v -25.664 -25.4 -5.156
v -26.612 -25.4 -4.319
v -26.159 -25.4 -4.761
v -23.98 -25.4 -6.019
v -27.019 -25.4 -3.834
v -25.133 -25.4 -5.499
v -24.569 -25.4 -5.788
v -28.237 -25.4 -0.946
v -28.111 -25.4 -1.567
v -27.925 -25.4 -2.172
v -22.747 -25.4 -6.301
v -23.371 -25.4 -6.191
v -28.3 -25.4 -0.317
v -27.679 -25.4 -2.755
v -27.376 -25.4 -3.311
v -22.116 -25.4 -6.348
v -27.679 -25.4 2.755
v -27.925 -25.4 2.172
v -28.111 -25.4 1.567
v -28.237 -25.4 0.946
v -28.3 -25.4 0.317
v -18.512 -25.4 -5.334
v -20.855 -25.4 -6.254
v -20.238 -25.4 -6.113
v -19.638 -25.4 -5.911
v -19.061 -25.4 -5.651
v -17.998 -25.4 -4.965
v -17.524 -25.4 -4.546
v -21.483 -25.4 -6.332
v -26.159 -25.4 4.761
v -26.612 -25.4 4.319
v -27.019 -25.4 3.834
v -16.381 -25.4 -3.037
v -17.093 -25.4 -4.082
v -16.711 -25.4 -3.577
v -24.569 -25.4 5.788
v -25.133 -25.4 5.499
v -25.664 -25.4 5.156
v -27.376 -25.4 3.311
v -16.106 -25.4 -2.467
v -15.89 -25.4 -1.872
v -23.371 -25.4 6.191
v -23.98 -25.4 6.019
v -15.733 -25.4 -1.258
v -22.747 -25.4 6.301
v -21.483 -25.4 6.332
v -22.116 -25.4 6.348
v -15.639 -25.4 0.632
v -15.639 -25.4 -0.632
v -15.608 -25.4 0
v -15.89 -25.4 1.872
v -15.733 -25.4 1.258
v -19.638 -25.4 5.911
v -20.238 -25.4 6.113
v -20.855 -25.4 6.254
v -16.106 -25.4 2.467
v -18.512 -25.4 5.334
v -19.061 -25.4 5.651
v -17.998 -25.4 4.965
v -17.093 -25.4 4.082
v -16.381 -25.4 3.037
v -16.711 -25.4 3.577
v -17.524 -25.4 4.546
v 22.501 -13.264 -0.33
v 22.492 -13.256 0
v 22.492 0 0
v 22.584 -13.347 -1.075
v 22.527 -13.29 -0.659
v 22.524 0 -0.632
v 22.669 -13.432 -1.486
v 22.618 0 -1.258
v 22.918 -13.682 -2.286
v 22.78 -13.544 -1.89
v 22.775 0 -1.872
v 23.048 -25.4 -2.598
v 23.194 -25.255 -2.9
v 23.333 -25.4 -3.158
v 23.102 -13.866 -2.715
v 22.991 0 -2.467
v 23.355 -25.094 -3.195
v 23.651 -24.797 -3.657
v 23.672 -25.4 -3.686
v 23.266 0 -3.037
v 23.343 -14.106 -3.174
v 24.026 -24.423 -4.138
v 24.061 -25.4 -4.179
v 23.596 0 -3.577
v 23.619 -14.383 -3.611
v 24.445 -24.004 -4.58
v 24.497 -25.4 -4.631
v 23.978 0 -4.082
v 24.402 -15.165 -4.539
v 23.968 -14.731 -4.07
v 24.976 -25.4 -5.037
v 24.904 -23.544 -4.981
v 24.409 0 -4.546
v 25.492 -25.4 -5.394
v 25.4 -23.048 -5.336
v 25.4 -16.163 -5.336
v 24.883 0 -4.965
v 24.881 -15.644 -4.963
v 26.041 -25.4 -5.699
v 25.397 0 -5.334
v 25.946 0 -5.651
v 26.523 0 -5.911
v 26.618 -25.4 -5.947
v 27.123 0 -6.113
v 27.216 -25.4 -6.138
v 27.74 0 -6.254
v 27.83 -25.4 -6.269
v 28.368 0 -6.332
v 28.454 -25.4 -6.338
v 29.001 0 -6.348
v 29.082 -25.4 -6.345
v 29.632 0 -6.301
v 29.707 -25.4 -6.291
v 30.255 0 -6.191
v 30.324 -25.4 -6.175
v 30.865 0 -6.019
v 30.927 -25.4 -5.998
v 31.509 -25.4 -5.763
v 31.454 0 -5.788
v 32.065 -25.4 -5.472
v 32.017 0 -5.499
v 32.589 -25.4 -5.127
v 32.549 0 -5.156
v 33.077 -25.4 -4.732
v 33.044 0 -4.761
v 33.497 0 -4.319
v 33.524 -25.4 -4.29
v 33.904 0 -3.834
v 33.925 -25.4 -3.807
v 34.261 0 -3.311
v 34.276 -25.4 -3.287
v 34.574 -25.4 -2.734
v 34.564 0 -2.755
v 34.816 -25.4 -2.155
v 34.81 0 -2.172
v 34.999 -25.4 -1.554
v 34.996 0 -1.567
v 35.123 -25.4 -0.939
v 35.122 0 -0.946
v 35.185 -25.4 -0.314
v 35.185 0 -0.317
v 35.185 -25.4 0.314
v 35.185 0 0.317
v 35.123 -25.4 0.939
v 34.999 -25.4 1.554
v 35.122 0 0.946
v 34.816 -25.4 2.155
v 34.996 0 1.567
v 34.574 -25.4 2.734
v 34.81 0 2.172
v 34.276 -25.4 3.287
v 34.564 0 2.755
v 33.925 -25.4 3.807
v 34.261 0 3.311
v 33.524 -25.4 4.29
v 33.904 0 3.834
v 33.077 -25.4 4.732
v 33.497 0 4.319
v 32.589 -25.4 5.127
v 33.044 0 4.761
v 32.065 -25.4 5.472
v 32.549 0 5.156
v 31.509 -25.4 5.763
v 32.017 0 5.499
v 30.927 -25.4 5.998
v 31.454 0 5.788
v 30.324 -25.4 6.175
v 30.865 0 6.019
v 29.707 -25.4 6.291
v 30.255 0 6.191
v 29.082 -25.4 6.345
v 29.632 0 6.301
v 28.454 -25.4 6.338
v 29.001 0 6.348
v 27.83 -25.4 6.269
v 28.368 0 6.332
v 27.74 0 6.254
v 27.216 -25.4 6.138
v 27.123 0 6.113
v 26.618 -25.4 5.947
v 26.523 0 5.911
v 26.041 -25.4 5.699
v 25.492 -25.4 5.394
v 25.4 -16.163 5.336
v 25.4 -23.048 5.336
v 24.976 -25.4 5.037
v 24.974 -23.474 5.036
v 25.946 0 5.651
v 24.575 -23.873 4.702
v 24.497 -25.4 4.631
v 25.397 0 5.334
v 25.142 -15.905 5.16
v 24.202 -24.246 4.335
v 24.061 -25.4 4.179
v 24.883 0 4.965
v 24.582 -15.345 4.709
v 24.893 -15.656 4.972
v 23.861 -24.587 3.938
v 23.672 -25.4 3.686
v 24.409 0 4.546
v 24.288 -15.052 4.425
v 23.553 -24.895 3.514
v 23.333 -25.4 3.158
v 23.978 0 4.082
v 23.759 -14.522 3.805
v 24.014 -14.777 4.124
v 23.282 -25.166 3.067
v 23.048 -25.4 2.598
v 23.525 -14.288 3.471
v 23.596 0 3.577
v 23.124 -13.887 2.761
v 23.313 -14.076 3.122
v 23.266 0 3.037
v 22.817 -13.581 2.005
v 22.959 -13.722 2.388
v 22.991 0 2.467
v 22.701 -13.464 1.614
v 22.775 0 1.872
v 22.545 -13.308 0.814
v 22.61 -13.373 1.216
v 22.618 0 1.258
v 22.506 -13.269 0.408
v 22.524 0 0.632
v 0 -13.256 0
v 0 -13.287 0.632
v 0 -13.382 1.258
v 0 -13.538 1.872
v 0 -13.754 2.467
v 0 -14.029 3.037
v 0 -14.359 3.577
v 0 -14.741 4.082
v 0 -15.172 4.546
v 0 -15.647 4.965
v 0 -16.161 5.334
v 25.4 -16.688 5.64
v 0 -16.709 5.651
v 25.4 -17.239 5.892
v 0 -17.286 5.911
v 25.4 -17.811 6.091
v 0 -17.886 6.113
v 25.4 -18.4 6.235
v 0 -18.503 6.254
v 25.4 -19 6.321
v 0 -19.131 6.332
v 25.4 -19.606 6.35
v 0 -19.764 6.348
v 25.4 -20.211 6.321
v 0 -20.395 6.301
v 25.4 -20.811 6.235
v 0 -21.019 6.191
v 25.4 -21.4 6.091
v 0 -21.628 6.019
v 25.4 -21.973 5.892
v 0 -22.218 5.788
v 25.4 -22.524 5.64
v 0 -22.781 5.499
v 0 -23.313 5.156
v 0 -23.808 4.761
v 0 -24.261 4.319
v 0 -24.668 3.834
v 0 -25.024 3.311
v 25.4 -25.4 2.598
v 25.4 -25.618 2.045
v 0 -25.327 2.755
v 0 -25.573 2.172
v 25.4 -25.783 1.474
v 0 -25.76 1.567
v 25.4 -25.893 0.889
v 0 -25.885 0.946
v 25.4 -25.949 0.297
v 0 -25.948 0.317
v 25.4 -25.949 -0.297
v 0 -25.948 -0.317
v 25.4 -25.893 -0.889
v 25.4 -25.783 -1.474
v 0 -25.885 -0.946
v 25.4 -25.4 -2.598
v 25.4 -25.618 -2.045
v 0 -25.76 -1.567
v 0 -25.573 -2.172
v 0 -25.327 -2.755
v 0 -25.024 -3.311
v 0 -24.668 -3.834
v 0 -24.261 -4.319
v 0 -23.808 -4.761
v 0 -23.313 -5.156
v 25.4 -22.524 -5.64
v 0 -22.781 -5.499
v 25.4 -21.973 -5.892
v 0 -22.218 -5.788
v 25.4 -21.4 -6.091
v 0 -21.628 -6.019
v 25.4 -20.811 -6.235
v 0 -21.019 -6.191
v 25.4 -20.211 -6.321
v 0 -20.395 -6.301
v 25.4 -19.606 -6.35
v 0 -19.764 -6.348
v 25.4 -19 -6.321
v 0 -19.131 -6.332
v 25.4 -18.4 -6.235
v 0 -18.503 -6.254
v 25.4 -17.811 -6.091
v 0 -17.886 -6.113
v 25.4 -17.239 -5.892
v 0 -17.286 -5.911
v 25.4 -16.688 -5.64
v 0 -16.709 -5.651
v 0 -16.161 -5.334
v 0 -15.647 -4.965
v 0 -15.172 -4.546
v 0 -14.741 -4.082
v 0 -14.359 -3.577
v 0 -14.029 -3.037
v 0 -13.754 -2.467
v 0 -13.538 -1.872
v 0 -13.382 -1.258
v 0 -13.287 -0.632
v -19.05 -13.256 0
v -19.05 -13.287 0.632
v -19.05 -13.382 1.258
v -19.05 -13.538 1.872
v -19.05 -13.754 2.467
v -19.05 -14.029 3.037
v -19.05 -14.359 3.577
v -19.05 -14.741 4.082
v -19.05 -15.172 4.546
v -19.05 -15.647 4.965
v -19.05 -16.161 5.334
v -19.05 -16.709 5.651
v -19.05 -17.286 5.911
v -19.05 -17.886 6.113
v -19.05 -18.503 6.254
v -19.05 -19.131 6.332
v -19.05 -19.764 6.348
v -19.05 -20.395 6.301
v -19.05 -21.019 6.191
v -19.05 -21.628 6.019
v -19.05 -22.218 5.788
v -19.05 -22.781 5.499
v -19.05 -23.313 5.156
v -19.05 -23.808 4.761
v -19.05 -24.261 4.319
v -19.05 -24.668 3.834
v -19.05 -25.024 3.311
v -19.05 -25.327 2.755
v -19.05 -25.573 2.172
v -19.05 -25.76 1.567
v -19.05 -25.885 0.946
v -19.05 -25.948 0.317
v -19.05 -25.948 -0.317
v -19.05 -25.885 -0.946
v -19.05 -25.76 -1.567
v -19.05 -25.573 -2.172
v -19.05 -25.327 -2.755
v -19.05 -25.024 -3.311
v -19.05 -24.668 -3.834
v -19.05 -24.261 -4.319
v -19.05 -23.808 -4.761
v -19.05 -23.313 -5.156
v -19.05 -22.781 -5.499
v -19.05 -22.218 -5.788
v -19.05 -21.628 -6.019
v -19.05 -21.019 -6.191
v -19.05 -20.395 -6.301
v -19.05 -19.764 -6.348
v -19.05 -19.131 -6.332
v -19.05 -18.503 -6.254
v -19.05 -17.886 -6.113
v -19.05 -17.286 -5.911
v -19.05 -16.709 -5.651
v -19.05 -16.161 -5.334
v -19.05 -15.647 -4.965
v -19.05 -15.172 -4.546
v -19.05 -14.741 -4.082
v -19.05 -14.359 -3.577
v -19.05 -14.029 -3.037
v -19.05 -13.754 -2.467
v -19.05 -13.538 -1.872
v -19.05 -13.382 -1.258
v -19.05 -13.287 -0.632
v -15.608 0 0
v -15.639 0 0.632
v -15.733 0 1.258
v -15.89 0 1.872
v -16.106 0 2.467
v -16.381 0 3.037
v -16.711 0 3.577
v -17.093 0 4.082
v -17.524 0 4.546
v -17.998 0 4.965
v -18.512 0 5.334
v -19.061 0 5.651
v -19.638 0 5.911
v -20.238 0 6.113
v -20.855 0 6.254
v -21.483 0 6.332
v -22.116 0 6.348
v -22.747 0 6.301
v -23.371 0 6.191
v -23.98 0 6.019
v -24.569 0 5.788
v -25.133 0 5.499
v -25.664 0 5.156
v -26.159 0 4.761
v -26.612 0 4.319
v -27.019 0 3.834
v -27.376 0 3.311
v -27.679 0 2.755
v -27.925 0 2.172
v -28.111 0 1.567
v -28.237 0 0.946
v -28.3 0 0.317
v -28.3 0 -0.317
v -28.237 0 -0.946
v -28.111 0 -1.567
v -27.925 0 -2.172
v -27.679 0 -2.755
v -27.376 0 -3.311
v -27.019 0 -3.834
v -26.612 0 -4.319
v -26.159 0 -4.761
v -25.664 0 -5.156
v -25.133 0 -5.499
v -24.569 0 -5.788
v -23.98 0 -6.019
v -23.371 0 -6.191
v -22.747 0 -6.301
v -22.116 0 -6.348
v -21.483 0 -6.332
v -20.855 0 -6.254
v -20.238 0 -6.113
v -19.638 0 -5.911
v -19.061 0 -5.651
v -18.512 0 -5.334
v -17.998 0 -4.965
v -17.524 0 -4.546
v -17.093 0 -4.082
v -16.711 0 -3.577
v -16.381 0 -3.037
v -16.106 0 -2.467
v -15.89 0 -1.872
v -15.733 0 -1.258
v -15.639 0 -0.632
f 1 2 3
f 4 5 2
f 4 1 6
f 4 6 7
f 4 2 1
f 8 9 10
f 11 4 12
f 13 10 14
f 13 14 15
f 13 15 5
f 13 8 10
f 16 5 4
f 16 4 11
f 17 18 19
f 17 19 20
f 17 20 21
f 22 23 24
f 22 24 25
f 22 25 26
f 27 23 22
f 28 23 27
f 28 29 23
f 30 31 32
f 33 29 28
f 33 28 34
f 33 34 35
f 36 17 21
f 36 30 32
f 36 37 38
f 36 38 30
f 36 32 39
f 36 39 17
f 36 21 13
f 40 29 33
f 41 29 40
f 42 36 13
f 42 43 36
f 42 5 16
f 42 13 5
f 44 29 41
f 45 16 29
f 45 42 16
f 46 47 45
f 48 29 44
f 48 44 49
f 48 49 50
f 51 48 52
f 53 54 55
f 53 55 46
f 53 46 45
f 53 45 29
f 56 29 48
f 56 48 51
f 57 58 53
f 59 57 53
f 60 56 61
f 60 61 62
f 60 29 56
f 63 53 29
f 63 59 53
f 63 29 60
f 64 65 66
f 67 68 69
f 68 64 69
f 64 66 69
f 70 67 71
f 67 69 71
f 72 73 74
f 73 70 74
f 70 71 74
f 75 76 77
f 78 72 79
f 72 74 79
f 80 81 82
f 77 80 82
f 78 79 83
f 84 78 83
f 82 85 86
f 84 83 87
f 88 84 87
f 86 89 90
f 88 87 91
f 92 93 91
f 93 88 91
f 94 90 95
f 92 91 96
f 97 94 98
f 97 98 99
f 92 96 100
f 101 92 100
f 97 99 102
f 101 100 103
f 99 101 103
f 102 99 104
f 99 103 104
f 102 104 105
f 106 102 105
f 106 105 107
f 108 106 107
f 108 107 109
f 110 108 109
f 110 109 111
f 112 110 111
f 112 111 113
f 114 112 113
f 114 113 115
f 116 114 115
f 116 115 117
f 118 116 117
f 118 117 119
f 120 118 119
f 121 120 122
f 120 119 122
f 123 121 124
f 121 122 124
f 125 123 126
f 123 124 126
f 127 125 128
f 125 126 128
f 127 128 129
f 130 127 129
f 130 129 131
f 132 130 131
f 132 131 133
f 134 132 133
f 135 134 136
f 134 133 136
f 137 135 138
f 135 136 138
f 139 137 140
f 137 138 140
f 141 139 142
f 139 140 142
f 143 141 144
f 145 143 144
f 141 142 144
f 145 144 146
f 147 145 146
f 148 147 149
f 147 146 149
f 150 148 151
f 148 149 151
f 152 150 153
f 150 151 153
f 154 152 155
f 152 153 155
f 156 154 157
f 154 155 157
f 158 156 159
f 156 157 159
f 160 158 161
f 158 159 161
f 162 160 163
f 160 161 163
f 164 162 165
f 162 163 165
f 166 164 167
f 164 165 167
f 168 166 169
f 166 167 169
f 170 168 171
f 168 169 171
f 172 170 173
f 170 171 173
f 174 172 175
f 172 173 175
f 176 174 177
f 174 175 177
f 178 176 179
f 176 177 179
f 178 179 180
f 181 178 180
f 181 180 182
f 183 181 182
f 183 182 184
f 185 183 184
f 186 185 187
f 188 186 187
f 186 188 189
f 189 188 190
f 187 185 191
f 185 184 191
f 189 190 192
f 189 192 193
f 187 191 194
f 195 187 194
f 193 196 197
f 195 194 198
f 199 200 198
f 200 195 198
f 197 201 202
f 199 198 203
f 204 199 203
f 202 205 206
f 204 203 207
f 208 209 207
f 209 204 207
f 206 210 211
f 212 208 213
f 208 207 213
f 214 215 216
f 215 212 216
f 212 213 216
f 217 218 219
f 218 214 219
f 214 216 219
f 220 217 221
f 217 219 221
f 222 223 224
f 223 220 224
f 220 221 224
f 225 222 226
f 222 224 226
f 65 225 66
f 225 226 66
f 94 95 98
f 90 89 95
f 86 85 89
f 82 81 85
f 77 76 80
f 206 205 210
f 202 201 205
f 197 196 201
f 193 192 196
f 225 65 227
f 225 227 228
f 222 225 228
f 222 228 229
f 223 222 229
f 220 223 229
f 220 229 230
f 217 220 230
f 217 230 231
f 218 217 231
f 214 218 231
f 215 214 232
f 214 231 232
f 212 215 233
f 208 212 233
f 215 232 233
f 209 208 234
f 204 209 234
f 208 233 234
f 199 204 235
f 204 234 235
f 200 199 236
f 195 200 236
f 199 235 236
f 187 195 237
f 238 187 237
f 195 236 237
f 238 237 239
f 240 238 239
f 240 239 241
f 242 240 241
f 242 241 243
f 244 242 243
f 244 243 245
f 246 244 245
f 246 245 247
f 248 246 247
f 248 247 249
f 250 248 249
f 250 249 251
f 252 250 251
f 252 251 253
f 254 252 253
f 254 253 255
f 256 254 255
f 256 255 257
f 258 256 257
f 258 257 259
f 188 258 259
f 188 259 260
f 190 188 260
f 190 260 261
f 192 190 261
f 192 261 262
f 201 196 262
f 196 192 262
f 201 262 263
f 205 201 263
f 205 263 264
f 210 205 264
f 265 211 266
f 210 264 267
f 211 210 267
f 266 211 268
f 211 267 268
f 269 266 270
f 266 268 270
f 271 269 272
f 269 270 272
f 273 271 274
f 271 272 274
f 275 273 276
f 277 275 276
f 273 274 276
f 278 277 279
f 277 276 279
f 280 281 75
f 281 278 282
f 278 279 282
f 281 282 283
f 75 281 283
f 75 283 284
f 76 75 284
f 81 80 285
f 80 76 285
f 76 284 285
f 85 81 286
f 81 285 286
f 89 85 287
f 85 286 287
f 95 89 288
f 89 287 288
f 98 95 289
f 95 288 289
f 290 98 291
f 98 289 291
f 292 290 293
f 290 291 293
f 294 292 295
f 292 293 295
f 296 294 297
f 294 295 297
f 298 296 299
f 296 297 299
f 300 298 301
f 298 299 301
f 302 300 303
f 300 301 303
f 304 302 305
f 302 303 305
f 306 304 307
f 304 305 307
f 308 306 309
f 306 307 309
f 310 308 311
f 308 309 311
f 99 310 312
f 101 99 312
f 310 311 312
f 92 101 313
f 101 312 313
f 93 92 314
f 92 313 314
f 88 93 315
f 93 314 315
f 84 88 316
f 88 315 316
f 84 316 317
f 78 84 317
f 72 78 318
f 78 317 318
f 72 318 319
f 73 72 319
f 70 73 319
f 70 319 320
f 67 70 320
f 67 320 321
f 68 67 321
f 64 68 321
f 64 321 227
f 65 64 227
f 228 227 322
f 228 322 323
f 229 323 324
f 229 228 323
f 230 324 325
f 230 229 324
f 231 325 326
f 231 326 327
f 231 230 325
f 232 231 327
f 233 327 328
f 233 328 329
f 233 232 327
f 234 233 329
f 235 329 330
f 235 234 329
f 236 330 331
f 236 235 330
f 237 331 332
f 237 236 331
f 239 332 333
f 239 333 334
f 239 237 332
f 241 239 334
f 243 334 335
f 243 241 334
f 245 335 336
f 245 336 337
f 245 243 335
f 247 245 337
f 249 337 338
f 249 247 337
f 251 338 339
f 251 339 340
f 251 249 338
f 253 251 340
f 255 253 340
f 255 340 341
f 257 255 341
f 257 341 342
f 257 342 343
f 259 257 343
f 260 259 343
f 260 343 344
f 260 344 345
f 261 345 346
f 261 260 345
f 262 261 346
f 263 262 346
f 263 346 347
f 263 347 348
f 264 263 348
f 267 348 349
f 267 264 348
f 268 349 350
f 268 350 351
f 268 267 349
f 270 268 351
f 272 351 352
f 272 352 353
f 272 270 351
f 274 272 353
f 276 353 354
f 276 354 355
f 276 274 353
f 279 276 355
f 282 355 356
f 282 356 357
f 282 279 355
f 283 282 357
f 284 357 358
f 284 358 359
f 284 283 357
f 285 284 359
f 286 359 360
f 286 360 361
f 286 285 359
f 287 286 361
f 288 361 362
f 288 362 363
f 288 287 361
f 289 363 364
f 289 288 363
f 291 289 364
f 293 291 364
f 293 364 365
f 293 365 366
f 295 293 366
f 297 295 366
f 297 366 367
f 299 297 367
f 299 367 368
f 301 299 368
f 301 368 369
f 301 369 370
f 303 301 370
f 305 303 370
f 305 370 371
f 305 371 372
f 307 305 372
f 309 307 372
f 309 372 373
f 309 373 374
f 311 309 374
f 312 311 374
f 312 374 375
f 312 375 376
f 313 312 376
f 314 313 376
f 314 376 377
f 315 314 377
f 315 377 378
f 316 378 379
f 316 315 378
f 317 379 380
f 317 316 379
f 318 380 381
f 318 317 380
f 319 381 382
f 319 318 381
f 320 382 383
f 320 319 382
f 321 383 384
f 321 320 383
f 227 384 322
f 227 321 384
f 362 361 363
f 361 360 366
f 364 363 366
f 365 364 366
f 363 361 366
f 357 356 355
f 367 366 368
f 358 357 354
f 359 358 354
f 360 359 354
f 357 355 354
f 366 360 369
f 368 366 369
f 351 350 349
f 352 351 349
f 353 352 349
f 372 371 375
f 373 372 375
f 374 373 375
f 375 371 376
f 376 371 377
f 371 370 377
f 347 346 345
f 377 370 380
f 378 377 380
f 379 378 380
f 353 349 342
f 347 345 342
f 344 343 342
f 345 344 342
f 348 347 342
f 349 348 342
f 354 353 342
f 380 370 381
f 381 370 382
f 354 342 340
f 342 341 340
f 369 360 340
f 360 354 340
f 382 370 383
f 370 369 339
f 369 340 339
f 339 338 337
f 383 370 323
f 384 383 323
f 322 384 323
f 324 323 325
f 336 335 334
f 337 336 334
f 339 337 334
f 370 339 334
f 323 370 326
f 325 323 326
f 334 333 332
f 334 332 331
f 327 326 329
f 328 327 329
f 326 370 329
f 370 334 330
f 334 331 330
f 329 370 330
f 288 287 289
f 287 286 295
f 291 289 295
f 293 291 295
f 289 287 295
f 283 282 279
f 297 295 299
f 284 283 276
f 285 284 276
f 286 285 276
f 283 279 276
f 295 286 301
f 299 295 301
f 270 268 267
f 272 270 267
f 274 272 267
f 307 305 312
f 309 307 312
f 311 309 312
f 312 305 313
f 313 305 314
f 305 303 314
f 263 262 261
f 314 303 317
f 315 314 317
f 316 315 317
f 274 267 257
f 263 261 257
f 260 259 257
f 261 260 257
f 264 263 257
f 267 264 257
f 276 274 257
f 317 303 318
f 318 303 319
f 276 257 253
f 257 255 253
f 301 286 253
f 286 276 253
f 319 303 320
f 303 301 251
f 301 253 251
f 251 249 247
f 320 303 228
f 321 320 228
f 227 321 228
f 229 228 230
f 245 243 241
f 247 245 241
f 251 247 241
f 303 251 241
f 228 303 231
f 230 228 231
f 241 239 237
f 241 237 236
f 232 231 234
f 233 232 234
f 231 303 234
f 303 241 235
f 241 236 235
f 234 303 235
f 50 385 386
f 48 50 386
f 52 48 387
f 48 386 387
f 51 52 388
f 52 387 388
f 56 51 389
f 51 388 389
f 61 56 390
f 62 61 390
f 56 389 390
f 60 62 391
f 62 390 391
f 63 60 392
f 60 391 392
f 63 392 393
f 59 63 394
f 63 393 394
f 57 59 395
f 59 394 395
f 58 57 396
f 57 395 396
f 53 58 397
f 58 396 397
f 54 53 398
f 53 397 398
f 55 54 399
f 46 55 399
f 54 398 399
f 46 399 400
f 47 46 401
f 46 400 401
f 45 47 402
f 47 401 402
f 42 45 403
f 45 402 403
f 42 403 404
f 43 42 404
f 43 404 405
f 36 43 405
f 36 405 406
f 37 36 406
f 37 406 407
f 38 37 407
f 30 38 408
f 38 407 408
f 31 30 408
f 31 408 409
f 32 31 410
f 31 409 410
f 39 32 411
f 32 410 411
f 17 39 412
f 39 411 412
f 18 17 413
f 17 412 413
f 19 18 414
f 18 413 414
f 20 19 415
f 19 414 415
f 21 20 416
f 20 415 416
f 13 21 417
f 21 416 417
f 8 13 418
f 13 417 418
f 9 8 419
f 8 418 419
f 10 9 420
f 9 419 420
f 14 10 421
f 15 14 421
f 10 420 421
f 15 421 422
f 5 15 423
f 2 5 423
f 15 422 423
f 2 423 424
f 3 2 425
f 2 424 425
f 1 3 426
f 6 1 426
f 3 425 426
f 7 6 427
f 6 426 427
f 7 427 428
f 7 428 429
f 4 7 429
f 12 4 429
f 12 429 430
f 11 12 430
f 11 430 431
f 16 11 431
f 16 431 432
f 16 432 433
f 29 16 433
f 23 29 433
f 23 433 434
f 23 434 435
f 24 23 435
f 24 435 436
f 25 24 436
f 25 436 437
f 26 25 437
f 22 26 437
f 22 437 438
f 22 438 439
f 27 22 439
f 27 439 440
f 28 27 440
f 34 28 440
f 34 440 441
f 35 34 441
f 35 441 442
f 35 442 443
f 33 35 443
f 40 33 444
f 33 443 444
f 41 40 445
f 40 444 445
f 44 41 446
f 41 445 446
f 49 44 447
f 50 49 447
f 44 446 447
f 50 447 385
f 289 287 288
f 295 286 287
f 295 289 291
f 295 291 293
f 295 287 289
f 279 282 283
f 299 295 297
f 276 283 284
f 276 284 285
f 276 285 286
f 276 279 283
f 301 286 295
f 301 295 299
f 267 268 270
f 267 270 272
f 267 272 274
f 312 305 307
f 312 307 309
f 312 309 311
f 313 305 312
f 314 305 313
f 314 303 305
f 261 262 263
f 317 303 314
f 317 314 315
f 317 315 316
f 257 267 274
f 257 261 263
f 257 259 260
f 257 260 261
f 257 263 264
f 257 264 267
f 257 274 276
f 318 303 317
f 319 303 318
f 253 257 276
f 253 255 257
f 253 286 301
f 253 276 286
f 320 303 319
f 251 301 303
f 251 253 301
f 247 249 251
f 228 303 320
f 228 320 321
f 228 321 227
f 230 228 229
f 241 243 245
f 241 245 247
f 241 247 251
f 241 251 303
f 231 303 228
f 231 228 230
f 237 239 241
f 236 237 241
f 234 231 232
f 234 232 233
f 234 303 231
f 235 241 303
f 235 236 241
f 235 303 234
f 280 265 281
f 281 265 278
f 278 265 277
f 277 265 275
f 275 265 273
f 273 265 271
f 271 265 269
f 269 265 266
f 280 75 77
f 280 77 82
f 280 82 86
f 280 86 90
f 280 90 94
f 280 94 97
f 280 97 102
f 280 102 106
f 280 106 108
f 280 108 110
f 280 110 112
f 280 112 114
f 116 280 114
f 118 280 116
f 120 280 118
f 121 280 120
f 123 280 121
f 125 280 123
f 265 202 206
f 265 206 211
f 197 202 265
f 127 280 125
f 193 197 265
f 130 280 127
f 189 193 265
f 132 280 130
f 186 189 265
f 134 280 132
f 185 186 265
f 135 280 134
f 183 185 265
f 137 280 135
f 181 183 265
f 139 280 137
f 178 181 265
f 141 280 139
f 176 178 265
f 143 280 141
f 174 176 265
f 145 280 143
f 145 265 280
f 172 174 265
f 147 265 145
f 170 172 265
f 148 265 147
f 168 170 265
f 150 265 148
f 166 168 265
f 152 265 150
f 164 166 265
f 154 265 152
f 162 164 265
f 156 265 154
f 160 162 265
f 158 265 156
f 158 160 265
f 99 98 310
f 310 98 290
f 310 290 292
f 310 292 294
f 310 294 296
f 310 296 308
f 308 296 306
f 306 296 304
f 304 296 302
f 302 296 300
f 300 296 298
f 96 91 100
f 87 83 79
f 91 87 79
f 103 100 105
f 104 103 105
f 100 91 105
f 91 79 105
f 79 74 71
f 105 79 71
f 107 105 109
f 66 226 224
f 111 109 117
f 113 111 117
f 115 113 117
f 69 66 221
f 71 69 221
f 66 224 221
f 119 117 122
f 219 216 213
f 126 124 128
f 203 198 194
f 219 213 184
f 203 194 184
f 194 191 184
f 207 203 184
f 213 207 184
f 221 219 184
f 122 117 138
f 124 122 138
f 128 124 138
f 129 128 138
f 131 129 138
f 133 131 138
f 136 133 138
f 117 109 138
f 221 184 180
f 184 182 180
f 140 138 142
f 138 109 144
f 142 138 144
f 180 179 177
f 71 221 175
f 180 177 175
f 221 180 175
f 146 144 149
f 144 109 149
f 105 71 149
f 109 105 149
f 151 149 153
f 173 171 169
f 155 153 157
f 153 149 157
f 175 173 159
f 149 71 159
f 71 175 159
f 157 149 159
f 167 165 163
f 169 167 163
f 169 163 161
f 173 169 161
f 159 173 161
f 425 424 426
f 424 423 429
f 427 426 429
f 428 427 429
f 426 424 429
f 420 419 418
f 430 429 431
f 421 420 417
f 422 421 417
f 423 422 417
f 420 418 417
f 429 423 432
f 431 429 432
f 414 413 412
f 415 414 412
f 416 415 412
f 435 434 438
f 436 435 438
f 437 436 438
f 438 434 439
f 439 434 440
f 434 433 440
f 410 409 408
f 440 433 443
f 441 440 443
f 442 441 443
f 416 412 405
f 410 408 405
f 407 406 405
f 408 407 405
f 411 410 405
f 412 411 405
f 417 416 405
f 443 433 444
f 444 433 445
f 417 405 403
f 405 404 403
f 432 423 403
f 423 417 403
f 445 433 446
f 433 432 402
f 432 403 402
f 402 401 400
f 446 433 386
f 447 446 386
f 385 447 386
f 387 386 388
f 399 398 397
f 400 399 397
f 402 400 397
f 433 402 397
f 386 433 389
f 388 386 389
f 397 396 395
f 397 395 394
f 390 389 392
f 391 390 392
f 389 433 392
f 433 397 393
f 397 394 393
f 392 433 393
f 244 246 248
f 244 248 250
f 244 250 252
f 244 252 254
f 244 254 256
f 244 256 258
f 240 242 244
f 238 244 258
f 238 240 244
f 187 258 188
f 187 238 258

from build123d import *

# Parameters (mm, degrees)
F0_R     = 6.35
F1_DEPTH = 25.4
F2_R     = 6.35
F3_DEPTH = 25.4
F4_DEPTH = 19.05


with BuildPart() as f1:
    # F0 (on Front) → F1 (new body)
    with BuildSketch(Plane.XZ):
        with Locations((-21.957509, 0)):
            Circle(F0_R)
        with BuildLine():
            ThreePointArc((35.192491, 0), (28.842491, 6.35), (22.492491, 0))
            ThreePointArc((22.492491, 0), (28.842491, -6.35), (35.192491, 0))
        make_face()
    extrude(amount=F1_DEPTH)

    # F2 (on Right) → F3 (join)
    with BuildSketch(Plane.YZ):
        with Locations((-19.605861, 0)):
            Circle(F2_R)
    extrude(amount=F3_DEPTH)


with BuildPart() as f4:
    # F2 (on Right) → F4 (new body)
    with BuildSketch(Plane.YZ):
        with Locations((-19.605861, 0)):
            Circle(F2_R)
    extrude(amount=-F4_DEPTH)


solid = Compound([f1.part, f4.part])
